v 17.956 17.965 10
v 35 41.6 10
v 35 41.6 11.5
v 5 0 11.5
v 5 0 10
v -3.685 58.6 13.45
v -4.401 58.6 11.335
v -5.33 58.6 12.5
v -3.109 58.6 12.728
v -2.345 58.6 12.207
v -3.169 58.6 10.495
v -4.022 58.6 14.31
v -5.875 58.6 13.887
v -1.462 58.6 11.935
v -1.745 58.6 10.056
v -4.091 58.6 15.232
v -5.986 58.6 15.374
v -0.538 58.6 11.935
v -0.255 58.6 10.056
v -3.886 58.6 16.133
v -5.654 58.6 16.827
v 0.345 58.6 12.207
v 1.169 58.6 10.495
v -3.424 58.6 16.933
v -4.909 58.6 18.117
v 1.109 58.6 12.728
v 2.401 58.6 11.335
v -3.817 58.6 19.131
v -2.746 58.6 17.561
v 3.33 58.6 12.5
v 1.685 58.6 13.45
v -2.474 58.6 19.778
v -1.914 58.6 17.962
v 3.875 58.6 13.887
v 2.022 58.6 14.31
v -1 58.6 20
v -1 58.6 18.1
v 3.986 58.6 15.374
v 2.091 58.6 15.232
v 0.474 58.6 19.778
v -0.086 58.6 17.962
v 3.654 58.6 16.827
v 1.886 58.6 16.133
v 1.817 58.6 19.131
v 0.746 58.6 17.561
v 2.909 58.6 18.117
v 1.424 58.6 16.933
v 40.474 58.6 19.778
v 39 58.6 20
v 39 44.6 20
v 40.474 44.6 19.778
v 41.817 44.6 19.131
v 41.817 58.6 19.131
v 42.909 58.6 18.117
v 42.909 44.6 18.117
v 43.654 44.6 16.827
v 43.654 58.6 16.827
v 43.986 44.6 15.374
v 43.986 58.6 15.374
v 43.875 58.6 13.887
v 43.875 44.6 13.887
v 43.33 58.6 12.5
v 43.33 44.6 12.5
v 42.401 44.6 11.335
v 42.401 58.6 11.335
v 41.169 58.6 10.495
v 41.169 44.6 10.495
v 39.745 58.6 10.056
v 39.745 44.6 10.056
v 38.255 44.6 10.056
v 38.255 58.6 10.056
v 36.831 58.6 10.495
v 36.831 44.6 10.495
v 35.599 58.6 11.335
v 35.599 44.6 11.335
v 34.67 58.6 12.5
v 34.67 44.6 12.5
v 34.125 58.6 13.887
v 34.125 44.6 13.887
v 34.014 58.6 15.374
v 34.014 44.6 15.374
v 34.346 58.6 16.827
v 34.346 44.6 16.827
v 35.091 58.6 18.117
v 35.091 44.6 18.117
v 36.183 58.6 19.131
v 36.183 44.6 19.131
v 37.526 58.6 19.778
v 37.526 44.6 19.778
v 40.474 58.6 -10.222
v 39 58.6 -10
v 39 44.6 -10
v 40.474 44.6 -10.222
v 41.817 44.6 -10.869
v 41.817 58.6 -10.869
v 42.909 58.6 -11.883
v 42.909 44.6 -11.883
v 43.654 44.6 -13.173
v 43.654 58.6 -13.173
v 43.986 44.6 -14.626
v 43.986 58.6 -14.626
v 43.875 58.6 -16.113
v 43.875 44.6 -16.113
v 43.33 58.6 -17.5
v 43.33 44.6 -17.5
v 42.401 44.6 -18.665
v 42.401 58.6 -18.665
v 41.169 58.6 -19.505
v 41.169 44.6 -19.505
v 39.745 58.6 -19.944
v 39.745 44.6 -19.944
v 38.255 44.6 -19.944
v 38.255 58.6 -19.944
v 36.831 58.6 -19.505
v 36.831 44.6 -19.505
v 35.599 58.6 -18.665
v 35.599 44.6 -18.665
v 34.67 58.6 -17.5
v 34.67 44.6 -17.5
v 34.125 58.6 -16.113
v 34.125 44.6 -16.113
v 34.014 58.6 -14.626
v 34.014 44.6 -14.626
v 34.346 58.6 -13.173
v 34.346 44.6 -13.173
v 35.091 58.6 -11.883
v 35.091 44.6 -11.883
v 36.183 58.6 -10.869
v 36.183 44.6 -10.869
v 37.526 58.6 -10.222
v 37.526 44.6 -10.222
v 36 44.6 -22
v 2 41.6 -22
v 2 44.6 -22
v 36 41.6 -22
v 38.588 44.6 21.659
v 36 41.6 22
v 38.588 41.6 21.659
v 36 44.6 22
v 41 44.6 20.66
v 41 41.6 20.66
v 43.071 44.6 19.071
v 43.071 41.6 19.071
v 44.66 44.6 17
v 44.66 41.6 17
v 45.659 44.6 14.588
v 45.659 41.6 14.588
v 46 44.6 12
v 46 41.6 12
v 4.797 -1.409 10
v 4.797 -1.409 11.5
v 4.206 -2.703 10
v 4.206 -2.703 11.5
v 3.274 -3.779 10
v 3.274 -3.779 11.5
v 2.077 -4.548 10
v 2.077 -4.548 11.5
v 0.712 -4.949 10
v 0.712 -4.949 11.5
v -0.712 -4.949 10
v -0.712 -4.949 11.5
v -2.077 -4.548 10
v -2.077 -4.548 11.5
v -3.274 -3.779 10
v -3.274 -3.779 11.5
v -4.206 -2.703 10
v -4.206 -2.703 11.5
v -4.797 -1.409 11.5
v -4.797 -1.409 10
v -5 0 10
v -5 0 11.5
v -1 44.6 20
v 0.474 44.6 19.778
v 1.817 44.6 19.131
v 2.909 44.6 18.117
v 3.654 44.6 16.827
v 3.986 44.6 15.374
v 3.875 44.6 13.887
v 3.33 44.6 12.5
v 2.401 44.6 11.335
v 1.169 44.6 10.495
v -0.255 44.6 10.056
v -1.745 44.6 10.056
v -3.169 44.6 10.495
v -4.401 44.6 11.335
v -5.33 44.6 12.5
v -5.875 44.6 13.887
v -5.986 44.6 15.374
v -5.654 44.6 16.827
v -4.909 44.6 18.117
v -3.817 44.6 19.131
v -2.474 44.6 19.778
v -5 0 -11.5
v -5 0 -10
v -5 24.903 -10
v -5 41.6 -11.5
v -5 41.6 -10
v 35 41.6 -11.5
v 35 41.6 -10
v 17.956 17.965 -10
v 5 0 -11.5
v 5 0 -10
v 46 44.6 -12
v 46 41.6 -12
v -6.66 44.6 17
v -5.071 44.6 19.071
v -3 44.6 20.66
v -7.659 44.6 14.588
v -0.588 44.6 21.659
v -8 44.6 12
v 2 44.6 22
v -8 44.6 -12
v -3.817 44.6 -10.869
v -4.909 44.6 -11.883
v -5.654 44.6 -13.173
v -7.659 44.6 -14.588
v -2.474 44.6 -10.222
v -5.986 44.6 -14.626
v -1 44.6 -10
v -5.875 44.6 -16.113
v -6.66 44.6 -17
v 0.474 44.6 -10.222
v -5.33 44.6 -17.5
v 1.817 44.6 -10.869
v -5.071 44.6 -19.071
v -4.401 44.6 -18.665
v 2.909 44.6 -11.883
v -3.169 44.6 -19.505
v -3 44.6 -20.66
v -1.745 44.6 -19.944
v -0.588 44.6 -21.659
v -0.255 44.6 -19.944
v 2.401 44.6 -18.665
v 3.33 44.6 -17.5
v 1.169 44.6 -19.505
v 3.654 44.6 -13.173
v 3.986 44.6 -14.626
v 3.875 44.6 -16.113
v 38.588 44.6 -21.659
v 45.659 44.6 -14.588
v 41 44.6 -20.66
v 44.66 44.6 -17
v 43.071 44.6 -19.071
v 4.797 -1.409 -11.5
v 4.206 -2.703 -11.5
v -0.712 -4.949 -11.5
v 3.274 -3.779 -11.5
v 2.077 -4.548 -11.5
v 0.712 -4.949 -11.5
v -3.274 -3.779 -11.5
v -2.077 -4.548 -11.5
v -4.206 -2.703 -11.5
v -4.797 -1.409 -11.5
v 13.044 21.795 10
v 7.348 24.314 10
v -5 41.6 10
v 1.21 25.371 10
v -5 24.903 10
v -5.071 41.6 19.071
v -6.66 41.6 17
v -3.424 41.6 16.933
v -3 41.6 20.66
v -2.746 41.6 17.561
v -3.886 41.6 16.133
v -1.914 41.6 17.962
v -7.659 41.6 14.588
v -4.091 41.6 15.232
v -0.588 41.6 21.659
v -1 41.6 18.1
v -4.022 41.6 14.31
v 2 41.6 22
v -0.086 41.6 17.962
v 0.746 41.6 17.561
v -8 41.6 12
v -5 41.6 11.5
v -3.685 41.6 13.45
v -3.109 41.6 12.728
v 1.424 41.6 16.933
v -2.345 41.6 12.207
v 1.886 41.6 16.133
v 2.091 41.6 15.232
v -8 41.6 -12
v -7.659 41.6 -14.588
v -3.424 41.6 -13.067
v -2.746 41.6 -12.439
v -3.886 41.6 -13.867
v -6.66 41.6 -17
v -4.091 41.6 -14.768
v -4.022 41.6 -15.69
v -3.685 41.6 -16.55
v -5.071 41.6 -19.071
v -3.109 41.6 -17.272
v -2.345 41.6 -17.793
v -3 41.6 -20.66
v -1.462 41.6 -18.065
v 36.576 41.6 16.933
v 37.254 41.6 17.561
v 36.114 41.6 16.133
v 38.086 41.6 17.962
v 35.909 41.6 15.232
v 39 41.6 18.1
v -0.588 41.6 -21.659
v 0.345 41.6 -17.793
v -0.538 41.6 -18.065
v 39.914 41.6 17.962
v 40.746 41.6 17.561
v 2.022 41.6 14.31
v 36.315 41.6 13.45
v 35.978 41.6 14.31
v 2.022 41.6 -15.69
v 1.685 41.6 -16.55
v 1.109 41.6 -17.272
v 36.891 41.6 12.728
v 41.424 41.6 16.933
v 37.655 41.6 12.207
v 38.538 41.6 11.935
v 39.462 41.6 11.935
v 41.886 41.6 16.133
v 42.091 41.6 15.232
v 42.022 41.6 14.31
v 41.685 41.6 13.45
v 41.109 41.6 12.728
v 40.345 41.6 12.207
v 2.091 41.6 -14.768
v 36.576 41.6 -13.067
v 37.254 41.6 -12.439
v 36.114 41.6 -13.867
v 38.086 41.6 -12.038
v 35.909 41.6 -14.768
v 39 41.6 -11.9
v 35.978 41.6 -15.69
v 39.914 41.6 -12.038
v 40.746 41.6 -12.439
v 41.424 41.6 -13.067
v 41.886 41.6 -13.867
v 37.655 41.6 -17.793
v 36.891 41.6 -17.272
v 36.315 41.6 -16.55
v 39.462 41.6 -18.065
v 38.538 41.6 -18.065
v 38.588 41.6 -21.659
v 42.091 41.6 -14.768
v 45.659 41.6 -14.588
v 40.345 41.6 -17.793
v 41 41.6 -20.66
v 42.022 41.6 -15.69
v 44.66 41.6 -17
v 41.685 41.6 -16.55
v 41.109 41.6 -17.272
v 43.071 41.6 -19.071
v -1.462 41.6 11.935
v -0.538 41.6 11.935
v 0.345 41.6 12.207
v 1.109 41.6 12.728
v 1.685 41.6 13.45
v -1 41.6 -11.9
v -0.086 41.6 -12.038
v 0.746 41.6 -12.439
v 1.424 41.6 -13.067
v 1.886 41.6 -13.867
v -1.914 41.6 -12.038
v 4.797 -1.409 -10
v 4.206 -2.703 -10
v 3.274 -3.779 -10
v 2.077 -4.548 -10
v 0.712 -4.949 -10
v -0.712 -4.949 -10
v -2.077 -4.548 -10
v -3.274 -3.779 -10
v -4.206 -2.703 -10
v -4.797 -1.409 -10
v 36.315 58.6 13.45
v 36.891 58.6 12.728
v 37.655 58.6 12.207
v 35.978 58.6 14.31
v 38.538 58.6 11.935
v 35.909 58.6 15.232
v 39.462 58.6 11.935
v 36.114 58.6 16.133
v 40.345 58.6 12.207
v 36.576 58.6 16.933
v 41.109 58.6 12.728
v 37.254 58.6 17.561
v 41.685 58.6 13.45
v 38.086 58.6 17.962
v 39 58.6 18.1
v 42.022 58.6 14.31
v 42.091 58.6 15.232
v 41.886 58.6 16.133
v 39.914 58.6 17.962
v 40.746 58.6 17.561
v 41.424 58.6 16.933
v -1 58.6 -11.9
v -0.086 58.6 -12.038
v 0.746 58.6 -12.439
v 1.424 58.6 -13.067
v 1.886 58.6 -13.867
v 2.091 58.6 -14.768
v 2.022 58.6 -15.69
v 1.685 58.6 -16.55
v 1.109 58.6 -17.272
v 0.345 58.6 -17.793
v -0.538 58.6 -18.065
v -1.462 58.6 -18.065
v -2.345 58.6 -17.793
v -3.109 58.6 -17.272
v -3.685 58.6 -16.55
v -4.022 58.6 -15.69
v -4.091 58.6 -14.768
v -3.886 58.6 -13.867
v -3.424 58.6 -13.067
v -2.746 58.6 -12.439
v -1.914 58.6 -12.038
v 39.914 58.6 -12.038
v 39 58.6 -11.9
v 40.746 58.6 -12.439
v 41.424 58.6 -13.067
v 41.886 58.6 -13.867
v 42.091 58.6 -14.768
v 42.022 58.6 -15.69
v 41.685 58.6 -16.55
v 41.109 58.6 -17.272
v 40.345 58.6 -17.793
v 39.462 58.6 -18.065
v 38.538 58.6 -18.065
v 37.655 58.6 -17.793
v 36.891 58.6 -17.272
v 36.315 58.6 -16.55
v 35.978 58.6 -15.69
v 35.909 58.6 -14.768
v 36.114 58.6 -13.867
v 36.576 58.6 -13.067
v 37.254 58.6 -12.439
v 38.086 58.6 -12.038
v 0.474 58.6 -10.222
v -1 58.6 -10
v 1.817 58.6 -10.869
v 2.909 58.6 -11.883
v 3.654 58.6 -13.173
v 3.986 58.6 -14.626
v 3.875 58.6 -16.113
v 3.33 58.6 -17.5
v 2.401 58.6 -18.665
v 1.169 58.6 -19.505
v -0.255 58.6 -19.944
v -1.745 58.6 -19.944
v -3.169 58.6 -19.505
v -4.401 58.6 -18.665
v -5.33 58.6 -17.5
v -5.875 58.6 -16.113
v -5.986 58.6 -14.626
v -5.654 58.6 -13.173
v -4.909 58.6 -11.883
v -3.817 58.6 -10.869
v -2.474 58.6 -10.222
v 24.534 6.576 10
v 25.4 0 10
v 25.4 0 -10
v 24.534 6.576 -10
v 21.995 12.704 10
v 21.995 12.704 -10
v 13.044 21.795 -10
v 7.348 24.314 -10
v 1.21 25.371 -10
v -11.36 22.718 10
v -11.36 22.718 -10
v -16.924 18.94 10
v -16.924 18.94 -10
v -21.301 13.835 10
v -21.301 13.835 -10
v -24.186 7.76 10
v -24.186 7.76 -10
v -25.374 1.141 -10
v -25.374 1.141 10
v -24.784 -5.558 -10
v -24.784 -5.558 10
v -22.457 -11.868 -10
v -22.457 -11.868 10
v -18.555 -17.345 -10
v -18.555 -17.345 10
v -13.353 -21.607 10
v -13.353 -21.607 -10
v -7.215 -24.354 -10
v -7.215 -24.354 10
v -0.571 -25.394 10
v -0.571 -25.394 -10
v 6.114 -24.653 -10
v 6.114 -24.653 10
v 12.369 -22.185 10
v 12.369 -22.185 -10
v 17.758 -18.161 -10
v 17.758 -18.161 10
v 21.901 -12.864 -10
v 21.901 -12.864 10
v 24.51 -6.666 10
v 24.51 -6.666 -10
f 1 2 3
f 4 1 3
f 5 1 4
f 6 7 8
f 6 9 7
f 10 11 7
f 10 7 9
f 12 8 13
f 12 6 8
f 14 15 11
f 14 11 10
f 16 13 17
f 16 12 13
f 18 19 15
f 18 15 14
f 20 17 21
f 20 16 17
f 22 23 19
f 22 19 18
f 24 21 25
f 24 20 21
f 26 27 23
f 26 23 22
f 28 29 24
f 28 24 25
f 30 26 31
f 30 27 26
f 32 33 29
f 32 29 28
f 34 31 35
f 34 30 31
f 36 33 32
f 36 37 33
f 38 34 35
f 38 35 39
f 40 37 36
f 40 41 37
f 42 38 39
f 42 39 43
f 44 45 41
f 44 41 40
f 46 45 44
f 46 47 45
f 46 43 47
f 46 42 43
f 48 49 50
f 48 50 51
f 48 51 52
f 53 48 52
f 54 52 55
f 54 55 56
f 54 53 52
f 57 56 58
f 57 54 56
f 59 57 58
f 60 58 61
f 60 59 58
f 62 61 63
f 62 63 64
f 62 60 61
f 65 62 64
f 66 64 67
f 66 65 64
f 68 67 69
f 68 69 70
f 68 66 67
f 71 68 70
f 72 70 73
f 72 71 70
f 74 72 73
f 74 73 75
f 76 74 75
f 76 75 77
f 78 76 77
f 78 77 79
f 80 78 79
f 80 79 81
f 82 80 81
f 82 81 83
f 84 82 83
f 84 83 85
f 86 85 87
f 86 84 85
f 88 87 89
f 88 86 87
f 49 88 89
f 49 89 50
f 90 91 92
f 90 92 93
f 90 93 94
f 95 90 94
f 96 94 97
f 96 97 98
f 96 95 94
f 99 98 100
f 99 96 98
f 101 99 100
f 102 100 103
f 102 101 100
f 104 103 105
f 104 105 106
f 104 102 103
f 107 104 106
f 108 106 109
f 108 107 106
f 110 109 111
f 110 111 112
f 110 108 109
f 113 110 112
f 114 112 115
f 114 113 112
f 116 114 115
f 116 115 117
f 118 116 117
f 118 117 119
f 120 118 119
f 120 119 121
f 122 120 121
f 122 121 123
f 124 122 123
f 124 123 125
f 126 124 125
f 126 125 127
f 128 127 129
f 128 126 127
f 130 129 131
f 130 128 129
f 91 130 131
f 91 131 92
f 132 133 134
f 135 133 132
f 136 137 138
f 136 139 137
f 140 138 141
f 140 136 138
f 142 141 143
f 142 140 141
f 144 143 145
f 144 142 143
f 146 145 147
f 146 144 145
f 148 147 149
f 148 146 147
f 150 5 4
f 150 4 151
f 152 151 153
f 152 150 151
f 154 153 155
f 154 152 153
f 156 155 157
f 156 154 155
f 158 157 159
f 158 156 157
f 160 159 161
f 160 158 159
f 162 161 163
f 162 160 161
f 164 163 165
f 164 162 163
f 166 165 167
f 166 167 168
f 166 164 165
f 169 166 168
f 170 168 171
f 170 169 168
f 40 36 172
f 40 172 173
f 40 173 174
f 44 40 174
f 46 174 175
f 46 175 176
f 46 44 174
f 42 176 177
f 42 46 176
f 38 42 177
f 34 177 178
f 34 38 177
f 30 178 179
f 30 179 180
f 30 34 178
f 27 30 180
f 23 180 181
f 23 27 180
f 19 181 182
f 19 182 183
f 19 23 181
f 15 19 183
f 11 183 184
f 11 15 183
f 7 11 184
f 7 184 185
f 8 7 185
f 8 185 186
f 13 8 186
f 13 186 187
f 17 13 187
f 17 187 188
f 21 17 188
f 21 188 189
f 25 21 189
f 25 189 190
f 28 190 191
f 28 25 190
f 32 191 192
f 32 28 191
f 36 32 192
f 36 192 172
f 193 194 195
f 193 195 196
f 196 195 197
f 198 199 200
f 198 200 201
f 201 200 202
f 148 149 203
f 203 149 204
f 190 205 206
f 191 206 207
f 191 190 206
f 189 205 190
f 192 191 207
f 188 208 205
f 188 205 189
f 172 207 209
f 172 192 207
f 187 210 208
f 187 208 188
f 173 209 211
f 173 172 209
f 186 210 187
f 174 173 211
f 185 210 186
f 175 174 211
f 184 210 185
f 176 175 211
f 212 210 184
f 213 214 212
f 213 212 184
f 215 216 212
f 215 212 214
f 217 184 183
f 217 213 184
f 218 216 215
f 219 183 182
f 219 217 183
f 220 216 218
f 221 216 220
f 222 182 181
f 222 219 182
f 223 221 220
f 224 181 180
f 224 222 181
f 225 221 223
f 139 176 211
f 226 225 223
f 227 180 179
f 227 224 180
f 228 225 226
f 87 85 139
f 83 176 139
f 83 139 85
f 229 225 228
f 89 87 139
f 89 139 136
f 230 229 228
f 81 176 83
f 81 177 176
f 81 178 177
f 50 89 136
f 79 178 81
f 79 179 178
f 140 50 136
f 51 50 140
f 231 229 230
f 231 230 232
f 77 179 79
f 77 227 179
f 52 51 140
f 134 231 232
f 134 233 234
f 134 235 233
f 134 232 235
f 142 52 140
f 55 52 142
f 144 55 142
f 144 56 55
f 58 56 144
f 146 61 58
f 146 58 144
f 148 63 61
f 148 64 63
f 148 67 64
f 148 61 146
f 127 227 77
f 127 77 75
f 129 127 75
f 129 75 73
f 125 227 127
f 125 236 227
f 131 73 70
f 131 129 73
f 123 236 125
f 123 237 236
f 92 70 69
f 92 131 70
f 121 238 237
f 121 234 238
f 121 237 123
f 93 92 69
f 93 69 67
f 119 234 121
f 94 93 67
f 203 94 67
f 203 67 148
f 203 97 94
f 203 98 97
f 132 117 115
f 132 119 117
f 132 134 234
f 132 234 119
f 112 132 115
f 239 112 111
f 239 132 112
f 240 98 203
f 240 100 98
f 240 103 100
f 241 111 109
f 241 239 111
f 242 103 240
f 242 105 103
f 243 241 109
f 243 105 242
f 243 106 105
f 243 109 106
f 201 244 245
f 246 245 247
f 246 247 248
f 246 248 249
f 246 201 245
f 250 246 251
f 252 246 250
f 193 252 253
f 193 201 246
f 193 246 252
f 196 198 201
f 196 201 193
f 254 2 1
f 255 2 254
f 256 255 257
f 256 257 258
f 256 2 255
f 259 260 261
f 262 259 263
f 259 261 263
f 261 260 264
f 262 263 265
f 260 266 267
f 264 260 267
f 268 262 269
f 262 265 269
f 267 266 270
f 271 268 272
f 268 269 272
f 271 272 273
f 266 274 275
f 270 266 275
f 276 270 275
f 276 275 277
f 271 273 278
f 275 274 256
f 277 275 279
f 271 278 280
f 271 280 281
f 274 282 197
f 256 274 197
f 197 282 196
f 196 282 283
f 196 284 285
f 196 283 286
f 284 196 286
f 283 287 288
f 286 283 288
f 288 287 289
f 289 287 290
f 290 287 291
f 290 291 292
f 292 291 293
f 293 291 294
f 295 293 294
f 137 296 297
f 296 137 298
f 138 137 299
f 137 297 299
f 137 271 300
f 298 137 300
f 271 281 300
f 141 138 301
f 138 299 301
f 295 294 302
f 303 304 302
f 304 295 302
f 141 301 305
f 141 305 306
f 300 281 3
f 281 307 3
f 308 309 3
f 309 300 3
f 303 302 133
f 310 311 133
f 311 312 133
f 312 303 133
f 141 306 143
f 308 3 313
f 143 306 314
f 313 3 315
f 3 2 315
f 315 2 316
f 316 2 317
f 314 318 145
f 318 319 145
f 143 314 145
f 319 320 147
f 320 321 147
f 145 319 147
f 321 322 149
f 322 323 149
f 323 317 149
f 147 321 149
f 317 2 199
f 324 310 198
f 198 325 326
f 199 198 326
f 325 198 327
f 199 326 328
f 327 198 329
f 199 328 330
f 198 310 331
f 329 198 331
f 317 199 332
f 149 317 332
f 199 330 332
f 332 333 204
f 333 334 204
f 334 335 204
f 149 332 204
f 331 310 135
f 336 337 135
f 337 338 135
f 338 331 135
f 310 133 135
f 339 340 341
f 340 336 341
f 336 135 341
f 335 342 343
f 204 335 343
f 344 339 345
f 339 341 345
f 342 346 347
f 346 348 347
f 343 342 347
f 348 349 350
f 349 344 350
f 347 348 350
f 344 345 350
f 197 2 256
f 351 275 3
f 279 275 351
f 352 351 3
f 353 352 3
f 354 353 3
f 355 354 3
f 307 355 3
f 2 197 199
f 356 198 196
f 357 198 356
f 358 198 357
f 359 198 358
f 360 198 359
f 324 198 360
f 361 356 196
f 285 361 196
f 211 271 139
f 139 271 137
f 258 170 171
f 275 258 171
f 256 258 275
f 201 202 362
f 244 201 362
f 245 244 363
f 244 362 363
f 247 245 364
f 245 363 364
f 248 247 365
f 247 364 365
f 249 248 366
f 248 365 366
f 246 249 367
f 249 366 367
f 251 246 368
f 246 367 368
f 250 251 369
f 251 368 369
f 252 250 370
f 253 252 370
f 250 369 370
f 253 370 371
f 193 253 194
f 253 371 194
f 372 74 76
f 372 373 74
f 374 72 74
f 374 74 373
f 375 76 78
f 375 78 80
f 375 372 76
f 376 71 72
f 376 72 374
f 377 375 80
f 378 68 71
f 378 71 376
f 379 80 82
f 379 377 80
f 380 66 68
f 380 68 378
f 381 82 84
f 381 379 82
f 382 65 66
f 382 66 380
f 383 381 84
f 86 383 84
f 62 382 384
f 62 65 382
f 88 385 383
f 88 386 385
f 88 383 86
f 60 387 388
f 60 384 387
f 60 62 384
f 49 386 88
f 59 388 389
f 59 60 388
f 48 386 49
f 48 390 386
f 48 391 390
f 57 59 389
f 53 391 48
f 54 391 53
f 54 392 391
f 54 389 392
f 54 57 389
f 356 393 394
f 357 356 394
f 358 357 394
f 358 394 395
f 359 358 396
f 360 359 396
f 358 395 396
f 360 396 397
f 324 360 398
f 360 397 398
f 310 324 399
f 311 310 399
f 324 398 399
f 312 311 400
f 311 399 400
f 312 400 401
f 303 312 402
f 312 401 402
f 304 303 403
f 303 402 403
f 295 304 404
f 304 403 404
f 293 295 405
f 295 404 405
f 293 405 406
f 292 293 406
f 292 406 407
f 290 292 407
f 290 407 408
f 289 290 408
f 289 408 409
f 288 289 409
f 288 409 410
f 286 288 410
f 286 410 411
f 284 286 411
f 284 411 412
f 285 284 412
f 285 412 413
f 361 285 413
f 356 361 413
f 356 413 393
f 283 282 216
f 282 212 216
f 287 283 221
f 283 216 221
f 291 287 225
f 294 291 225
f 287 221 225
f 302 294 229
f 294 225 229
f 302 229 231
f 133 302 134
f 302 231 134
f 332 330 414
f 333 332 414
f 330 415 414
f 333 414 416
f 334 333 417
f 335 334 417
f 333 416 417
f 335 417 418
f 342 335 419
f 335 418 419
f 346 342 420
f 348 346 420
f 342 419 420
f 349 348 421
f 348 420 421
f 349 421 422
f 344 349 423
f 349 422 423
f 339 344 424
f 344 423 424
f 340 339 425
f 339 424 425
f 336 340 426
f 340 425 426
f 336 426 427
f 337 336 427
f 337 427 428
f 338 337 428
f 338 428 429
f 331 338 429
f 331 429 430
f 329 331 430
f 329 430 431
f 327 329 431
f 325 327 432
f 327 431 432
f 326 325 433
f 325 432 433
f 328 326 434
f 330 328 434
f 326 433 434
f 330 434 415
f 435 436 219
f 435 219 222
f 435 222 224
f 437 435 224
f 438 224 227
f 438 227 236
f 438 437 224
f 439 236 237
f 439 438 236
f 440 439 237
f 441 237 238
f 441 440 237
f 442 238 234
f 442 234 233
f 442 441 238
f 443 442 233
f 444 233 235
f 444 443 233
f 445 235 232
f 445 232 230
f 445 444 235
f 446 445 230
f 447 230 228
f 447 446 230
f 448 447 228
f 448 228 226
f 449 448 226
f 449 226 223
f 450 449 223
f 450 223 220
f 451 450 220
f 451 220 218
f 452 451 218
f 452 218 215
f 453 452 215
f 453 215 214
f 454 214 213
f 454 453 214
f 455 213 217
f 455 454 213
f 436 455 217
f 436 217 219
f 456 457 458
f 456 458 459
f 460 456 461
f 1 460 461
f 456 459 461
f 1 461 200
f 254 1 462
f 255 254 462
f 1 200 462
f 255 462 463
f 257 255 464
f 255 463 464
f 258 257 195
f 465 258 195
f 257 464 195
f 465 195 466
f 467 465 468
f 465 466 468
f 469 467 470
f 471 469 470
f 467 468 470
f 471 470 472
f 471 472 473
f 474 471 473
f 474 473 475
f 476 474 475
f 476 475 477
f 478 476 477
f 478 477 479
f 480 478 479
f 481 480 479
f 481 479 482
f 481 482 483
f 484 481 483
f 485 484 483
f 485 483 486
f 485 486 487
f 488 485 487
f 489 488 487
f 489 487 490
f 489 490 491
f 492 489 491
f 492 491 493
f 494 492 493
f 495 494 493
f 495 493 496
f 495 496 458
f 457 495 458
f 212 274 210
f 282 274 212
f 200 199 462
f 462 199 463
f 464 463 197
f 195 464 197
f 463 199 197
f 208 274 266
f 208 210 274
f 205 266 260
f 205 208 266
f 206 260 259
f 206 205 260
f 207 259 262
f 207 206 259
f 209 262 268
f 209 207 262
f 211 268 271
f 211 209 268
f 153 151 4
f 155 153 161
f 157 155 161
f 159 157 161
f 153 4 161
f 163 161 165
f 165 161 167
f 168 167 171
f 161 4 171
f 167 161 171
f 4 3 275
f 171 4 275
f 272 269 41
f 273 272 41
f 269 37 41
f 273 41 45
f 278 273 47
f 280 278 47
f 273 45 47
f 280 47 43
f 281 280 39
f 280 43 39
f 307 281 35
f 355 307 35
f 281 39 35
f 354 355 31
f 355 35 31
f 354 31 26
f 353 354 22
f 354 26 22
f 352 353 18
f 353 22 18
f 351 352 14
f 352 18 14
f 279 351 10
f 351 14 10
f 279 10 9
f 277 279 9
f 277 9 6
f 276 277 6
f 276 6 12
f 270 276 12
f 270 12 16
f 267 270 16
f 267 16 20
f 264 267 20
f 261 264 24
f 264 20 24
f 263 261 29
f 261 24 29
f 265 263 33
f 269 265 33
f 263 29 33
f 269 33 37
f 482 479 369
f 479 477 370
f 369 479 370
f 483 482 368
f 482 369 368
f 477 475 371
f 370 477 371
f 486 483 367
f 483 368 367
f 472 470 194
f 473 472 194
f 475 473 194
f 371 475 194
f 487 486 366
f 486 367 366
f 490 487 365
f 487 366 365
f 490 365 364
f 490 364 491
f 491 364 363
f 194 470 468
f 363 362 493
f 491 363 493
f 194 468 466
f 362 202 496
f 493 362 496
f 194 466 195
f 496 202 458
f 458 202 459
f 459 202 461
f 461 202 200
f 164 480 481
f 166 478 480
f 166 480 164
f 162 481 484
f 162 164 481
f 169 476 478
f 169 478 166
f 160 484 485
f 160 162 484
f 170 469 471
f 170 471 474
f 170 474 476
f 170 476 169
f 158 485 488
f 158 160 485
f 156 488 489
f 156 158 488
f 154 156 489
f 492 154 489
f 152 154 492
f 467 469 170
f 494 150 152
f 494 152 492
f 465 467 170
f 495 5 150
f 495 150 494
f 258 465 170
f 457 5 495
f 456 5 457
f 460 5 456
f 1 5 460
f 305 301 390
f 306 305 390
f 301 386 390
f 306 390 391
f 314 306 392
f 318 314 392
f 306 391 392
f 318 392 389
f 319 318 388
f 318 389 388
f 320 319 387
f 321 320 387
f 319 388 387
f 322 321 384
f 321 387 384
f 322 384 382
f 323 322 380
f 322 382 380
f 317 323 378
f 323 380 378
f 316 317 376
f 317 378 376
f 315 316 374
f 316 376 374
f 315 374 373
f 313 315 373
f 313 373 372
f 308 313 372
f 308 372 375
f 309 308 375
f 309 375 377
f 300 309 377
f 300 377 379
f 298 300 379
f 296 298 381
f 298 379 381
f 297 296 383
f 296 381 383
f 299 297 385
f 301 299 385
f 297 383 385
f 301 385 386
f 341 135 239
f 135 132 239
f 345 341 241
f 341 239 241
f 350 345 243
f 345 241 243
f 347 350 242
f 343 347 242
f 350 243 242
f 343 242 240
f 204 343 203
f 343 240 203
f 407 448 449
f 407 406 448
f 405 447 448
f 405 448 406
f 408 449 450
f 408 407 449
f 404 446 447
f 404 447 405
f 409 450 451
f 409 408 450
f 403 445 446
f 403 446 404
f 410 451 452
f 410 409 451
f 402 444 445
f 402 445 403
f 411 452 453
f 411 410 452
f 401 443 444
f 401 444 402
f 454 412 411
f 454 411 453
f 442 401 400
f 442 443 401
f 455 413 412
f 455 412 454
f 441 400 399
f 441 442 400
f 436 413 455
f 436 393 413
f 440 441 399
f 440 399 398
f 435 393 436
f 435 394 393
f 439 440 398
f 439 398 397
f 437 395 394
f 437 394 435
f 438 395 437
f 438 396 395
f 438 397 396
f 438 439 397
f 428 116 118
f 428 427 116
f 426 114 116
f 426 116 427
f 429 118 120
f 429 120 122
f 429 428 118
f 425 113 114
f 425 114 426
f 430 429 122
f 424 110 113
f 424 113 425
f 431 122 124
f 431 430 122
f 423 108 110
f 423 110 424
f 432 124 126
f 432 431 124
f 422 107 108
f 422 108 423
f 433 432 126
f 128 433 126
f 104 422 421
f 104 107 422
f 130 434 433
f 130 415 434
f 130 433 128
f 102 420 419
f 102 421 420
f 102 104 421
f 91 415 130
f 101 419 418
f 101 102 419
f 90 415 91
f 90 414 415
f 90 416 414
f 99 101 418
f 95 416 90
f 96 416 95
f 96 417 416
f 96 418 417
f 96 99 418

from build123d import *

# Parameters (mm, degrees)
EXTRUDE_1_DEPTH      = 10
EXTRUDE_1_DEPTH_BACK = 10
SKETCH_1_R           = 25.4
EXTRUDE_2_DEPTH      = 1.5
SKETCH_3_W           = 54
SKETCH_3_H           = 44
EXTRUDE_3_DEPTH      = 3
SKETCH_4_R           = 3.1
CUT_EXTRUDE_1_DEPTH  = 3
FILLET_1_R           = 10
EXTRUDE_START        = 14
SKETCH_5_R           = 5
SKETCH_5_R_2         = 3.1
EXTRUDE_4_DEPTH      = 14


with BuildPart() as part:
    # 草图1 → 凸台-拉伸1 (new, two sides: drawn at the far end of the back side and taken through both)
    with BuildSketch(Plane.XY.offset(-EXTRUDE_1_DEPTH_BACK)):
        Circle(SKETCH_1_R)
    extrude(amount=EXTRUDE_1_DEPTH + EXTRUDE_1_DEPTH_BACK)

    # 草图2 → 凸台-拉伸2 (add)
    with BuildSketch(Plane.XY.offset(10)):
        with BuildLine():
            Line((-5, 0), (-5, 41.6))
            Line((-5, 41.6), (35, 41.6))
            Line((35, 41.6), (5, 0))
            ThreePointArc((5, 0), (0, -5), (-5, 0))
        make_face()
    extrude_2 = extrude(amount=EXTRUDE_2_DEPTH)

    # 镜向1: 凸台-拉伸2 across plane
    add(extrude_2.mirror(Plane.XY))

    # 草图3 → 凸台-拉伸3 (add)
    with BuildSketch(Plane(origin=(0, 41.6, 0), x_dir=(1, 0, 0), z_dir=(0, 1, 0))):
        with Locations((19, 0)):
            Rectangle(SKETCH_3_W, SKETCH_3_H)
    extrude(amount=EXTRUDE_3_DEPTH)

    # 草图4 → 切除-拉伸1 (cut)
    with BuildSketch(Plane(origin=(0, 44.6, 0), x_dir=(1, 0, 0), z_dir=(0, 1, 0))):
        with Locations(Location((-1, 15, 0), (0, 0, 270))):
            Circle(SKETCH_4_R)
        with Locations(Location((39, 15, 0), (0, 0, 270))):
            Circle(SKETCH_4_R)
        with Locations(Location((39, -15, 0), (0, 0, 270))):
            Circle(SKETCH_4_R)
        with Locations(Location((-1, -15, 0), (0, 0, 270))):
            Circle(SKETCH_4_R)
    extrude(amount=-CUT_EXTRUDE_1_DEPTH, mode=Mode.SUBTRACT)

    # 圆角1
    fillet_1_edges = [part.edges().sort_by_distance(p)[0] for p in [
        (-8, 43.1, -22),
        (-8, 43.1, 22),
        (46, 43.1, 22),
        (46, 43.1, -22),
    ]]
    fillet(fillet_1_edges, radius=FILLET_1_R)

    # 草图5 → 凸台-拉伸4 (add)
    # profile 1 of 4: a face of its own
    with BuildSketch(Plane(origin=(0, 44.6, 0), x_dir=(1, 0, 0), z_dir=(0, 1, 0)).offset(EXTRUDE_START)):
        with Locations(Location((-1, 15, 0), (0, 0, 270))):
            Circle(SKETCH_5_R)
        with Locations(Location((-1, 15, 0), (0, 0, 270))):
            Circle(SKETCH_5_R_2, mode=Mode.SUBTRACT)
    # profile 2 of 4: a face of its own
    with BuildSketch(Plane(origin=(0, 44.6, 0), x_dir=(1, 0, 0), z_dir=(0, 1, 0)).offset(EXTRUDE_START)):
        with Locations(Location((39, 15, 0), (0, 0, 270))):
            Circle(SKETCH_5_R)
        with Locations(Location((39, 15, 0), (0, 0, 270))):
            Circle(SKETCH_5_R_2, mode=Mode.SUBTRACT)
    # profile 3 of 4: a face of its own
    with BuildSketch(Plane(origin=(0, 44.6, 0), x_dir=(1, 0, 0), z_dir=(0, 1, 0)).offset(EXTRUDE_START)):
        with Locations(Location((-1, -15, 0), (0, 0, 270))):
            Circle(SKETCH_5_R)
        with Locations(Location((-1, -15, 0), (0, 0, 270))):
            Circle(SKETCH_5_R_2, mode=Mode.SUBTRACT)
    # profile 4 of 4: a face of its own
    with BuildSketch(Plane(origin=(0, 44.6, 0), x_dir=(1, 0, 0), z_dir=(0, 1, 0)).offset(EXTRUDE_START)):
        with Locations(Location((39, -15, 0), (0, 0, 270))):
            Circle(SKETCH_5_R)
        with Locations(Location((39, -15, 0), (0, 0, 270))):
            Circle(SKETCH_5_R_2, mode=Mode.SUBTRACT)
    extrude(amount=-EXTRUDE_4_DEPTH)


solid = part.part
